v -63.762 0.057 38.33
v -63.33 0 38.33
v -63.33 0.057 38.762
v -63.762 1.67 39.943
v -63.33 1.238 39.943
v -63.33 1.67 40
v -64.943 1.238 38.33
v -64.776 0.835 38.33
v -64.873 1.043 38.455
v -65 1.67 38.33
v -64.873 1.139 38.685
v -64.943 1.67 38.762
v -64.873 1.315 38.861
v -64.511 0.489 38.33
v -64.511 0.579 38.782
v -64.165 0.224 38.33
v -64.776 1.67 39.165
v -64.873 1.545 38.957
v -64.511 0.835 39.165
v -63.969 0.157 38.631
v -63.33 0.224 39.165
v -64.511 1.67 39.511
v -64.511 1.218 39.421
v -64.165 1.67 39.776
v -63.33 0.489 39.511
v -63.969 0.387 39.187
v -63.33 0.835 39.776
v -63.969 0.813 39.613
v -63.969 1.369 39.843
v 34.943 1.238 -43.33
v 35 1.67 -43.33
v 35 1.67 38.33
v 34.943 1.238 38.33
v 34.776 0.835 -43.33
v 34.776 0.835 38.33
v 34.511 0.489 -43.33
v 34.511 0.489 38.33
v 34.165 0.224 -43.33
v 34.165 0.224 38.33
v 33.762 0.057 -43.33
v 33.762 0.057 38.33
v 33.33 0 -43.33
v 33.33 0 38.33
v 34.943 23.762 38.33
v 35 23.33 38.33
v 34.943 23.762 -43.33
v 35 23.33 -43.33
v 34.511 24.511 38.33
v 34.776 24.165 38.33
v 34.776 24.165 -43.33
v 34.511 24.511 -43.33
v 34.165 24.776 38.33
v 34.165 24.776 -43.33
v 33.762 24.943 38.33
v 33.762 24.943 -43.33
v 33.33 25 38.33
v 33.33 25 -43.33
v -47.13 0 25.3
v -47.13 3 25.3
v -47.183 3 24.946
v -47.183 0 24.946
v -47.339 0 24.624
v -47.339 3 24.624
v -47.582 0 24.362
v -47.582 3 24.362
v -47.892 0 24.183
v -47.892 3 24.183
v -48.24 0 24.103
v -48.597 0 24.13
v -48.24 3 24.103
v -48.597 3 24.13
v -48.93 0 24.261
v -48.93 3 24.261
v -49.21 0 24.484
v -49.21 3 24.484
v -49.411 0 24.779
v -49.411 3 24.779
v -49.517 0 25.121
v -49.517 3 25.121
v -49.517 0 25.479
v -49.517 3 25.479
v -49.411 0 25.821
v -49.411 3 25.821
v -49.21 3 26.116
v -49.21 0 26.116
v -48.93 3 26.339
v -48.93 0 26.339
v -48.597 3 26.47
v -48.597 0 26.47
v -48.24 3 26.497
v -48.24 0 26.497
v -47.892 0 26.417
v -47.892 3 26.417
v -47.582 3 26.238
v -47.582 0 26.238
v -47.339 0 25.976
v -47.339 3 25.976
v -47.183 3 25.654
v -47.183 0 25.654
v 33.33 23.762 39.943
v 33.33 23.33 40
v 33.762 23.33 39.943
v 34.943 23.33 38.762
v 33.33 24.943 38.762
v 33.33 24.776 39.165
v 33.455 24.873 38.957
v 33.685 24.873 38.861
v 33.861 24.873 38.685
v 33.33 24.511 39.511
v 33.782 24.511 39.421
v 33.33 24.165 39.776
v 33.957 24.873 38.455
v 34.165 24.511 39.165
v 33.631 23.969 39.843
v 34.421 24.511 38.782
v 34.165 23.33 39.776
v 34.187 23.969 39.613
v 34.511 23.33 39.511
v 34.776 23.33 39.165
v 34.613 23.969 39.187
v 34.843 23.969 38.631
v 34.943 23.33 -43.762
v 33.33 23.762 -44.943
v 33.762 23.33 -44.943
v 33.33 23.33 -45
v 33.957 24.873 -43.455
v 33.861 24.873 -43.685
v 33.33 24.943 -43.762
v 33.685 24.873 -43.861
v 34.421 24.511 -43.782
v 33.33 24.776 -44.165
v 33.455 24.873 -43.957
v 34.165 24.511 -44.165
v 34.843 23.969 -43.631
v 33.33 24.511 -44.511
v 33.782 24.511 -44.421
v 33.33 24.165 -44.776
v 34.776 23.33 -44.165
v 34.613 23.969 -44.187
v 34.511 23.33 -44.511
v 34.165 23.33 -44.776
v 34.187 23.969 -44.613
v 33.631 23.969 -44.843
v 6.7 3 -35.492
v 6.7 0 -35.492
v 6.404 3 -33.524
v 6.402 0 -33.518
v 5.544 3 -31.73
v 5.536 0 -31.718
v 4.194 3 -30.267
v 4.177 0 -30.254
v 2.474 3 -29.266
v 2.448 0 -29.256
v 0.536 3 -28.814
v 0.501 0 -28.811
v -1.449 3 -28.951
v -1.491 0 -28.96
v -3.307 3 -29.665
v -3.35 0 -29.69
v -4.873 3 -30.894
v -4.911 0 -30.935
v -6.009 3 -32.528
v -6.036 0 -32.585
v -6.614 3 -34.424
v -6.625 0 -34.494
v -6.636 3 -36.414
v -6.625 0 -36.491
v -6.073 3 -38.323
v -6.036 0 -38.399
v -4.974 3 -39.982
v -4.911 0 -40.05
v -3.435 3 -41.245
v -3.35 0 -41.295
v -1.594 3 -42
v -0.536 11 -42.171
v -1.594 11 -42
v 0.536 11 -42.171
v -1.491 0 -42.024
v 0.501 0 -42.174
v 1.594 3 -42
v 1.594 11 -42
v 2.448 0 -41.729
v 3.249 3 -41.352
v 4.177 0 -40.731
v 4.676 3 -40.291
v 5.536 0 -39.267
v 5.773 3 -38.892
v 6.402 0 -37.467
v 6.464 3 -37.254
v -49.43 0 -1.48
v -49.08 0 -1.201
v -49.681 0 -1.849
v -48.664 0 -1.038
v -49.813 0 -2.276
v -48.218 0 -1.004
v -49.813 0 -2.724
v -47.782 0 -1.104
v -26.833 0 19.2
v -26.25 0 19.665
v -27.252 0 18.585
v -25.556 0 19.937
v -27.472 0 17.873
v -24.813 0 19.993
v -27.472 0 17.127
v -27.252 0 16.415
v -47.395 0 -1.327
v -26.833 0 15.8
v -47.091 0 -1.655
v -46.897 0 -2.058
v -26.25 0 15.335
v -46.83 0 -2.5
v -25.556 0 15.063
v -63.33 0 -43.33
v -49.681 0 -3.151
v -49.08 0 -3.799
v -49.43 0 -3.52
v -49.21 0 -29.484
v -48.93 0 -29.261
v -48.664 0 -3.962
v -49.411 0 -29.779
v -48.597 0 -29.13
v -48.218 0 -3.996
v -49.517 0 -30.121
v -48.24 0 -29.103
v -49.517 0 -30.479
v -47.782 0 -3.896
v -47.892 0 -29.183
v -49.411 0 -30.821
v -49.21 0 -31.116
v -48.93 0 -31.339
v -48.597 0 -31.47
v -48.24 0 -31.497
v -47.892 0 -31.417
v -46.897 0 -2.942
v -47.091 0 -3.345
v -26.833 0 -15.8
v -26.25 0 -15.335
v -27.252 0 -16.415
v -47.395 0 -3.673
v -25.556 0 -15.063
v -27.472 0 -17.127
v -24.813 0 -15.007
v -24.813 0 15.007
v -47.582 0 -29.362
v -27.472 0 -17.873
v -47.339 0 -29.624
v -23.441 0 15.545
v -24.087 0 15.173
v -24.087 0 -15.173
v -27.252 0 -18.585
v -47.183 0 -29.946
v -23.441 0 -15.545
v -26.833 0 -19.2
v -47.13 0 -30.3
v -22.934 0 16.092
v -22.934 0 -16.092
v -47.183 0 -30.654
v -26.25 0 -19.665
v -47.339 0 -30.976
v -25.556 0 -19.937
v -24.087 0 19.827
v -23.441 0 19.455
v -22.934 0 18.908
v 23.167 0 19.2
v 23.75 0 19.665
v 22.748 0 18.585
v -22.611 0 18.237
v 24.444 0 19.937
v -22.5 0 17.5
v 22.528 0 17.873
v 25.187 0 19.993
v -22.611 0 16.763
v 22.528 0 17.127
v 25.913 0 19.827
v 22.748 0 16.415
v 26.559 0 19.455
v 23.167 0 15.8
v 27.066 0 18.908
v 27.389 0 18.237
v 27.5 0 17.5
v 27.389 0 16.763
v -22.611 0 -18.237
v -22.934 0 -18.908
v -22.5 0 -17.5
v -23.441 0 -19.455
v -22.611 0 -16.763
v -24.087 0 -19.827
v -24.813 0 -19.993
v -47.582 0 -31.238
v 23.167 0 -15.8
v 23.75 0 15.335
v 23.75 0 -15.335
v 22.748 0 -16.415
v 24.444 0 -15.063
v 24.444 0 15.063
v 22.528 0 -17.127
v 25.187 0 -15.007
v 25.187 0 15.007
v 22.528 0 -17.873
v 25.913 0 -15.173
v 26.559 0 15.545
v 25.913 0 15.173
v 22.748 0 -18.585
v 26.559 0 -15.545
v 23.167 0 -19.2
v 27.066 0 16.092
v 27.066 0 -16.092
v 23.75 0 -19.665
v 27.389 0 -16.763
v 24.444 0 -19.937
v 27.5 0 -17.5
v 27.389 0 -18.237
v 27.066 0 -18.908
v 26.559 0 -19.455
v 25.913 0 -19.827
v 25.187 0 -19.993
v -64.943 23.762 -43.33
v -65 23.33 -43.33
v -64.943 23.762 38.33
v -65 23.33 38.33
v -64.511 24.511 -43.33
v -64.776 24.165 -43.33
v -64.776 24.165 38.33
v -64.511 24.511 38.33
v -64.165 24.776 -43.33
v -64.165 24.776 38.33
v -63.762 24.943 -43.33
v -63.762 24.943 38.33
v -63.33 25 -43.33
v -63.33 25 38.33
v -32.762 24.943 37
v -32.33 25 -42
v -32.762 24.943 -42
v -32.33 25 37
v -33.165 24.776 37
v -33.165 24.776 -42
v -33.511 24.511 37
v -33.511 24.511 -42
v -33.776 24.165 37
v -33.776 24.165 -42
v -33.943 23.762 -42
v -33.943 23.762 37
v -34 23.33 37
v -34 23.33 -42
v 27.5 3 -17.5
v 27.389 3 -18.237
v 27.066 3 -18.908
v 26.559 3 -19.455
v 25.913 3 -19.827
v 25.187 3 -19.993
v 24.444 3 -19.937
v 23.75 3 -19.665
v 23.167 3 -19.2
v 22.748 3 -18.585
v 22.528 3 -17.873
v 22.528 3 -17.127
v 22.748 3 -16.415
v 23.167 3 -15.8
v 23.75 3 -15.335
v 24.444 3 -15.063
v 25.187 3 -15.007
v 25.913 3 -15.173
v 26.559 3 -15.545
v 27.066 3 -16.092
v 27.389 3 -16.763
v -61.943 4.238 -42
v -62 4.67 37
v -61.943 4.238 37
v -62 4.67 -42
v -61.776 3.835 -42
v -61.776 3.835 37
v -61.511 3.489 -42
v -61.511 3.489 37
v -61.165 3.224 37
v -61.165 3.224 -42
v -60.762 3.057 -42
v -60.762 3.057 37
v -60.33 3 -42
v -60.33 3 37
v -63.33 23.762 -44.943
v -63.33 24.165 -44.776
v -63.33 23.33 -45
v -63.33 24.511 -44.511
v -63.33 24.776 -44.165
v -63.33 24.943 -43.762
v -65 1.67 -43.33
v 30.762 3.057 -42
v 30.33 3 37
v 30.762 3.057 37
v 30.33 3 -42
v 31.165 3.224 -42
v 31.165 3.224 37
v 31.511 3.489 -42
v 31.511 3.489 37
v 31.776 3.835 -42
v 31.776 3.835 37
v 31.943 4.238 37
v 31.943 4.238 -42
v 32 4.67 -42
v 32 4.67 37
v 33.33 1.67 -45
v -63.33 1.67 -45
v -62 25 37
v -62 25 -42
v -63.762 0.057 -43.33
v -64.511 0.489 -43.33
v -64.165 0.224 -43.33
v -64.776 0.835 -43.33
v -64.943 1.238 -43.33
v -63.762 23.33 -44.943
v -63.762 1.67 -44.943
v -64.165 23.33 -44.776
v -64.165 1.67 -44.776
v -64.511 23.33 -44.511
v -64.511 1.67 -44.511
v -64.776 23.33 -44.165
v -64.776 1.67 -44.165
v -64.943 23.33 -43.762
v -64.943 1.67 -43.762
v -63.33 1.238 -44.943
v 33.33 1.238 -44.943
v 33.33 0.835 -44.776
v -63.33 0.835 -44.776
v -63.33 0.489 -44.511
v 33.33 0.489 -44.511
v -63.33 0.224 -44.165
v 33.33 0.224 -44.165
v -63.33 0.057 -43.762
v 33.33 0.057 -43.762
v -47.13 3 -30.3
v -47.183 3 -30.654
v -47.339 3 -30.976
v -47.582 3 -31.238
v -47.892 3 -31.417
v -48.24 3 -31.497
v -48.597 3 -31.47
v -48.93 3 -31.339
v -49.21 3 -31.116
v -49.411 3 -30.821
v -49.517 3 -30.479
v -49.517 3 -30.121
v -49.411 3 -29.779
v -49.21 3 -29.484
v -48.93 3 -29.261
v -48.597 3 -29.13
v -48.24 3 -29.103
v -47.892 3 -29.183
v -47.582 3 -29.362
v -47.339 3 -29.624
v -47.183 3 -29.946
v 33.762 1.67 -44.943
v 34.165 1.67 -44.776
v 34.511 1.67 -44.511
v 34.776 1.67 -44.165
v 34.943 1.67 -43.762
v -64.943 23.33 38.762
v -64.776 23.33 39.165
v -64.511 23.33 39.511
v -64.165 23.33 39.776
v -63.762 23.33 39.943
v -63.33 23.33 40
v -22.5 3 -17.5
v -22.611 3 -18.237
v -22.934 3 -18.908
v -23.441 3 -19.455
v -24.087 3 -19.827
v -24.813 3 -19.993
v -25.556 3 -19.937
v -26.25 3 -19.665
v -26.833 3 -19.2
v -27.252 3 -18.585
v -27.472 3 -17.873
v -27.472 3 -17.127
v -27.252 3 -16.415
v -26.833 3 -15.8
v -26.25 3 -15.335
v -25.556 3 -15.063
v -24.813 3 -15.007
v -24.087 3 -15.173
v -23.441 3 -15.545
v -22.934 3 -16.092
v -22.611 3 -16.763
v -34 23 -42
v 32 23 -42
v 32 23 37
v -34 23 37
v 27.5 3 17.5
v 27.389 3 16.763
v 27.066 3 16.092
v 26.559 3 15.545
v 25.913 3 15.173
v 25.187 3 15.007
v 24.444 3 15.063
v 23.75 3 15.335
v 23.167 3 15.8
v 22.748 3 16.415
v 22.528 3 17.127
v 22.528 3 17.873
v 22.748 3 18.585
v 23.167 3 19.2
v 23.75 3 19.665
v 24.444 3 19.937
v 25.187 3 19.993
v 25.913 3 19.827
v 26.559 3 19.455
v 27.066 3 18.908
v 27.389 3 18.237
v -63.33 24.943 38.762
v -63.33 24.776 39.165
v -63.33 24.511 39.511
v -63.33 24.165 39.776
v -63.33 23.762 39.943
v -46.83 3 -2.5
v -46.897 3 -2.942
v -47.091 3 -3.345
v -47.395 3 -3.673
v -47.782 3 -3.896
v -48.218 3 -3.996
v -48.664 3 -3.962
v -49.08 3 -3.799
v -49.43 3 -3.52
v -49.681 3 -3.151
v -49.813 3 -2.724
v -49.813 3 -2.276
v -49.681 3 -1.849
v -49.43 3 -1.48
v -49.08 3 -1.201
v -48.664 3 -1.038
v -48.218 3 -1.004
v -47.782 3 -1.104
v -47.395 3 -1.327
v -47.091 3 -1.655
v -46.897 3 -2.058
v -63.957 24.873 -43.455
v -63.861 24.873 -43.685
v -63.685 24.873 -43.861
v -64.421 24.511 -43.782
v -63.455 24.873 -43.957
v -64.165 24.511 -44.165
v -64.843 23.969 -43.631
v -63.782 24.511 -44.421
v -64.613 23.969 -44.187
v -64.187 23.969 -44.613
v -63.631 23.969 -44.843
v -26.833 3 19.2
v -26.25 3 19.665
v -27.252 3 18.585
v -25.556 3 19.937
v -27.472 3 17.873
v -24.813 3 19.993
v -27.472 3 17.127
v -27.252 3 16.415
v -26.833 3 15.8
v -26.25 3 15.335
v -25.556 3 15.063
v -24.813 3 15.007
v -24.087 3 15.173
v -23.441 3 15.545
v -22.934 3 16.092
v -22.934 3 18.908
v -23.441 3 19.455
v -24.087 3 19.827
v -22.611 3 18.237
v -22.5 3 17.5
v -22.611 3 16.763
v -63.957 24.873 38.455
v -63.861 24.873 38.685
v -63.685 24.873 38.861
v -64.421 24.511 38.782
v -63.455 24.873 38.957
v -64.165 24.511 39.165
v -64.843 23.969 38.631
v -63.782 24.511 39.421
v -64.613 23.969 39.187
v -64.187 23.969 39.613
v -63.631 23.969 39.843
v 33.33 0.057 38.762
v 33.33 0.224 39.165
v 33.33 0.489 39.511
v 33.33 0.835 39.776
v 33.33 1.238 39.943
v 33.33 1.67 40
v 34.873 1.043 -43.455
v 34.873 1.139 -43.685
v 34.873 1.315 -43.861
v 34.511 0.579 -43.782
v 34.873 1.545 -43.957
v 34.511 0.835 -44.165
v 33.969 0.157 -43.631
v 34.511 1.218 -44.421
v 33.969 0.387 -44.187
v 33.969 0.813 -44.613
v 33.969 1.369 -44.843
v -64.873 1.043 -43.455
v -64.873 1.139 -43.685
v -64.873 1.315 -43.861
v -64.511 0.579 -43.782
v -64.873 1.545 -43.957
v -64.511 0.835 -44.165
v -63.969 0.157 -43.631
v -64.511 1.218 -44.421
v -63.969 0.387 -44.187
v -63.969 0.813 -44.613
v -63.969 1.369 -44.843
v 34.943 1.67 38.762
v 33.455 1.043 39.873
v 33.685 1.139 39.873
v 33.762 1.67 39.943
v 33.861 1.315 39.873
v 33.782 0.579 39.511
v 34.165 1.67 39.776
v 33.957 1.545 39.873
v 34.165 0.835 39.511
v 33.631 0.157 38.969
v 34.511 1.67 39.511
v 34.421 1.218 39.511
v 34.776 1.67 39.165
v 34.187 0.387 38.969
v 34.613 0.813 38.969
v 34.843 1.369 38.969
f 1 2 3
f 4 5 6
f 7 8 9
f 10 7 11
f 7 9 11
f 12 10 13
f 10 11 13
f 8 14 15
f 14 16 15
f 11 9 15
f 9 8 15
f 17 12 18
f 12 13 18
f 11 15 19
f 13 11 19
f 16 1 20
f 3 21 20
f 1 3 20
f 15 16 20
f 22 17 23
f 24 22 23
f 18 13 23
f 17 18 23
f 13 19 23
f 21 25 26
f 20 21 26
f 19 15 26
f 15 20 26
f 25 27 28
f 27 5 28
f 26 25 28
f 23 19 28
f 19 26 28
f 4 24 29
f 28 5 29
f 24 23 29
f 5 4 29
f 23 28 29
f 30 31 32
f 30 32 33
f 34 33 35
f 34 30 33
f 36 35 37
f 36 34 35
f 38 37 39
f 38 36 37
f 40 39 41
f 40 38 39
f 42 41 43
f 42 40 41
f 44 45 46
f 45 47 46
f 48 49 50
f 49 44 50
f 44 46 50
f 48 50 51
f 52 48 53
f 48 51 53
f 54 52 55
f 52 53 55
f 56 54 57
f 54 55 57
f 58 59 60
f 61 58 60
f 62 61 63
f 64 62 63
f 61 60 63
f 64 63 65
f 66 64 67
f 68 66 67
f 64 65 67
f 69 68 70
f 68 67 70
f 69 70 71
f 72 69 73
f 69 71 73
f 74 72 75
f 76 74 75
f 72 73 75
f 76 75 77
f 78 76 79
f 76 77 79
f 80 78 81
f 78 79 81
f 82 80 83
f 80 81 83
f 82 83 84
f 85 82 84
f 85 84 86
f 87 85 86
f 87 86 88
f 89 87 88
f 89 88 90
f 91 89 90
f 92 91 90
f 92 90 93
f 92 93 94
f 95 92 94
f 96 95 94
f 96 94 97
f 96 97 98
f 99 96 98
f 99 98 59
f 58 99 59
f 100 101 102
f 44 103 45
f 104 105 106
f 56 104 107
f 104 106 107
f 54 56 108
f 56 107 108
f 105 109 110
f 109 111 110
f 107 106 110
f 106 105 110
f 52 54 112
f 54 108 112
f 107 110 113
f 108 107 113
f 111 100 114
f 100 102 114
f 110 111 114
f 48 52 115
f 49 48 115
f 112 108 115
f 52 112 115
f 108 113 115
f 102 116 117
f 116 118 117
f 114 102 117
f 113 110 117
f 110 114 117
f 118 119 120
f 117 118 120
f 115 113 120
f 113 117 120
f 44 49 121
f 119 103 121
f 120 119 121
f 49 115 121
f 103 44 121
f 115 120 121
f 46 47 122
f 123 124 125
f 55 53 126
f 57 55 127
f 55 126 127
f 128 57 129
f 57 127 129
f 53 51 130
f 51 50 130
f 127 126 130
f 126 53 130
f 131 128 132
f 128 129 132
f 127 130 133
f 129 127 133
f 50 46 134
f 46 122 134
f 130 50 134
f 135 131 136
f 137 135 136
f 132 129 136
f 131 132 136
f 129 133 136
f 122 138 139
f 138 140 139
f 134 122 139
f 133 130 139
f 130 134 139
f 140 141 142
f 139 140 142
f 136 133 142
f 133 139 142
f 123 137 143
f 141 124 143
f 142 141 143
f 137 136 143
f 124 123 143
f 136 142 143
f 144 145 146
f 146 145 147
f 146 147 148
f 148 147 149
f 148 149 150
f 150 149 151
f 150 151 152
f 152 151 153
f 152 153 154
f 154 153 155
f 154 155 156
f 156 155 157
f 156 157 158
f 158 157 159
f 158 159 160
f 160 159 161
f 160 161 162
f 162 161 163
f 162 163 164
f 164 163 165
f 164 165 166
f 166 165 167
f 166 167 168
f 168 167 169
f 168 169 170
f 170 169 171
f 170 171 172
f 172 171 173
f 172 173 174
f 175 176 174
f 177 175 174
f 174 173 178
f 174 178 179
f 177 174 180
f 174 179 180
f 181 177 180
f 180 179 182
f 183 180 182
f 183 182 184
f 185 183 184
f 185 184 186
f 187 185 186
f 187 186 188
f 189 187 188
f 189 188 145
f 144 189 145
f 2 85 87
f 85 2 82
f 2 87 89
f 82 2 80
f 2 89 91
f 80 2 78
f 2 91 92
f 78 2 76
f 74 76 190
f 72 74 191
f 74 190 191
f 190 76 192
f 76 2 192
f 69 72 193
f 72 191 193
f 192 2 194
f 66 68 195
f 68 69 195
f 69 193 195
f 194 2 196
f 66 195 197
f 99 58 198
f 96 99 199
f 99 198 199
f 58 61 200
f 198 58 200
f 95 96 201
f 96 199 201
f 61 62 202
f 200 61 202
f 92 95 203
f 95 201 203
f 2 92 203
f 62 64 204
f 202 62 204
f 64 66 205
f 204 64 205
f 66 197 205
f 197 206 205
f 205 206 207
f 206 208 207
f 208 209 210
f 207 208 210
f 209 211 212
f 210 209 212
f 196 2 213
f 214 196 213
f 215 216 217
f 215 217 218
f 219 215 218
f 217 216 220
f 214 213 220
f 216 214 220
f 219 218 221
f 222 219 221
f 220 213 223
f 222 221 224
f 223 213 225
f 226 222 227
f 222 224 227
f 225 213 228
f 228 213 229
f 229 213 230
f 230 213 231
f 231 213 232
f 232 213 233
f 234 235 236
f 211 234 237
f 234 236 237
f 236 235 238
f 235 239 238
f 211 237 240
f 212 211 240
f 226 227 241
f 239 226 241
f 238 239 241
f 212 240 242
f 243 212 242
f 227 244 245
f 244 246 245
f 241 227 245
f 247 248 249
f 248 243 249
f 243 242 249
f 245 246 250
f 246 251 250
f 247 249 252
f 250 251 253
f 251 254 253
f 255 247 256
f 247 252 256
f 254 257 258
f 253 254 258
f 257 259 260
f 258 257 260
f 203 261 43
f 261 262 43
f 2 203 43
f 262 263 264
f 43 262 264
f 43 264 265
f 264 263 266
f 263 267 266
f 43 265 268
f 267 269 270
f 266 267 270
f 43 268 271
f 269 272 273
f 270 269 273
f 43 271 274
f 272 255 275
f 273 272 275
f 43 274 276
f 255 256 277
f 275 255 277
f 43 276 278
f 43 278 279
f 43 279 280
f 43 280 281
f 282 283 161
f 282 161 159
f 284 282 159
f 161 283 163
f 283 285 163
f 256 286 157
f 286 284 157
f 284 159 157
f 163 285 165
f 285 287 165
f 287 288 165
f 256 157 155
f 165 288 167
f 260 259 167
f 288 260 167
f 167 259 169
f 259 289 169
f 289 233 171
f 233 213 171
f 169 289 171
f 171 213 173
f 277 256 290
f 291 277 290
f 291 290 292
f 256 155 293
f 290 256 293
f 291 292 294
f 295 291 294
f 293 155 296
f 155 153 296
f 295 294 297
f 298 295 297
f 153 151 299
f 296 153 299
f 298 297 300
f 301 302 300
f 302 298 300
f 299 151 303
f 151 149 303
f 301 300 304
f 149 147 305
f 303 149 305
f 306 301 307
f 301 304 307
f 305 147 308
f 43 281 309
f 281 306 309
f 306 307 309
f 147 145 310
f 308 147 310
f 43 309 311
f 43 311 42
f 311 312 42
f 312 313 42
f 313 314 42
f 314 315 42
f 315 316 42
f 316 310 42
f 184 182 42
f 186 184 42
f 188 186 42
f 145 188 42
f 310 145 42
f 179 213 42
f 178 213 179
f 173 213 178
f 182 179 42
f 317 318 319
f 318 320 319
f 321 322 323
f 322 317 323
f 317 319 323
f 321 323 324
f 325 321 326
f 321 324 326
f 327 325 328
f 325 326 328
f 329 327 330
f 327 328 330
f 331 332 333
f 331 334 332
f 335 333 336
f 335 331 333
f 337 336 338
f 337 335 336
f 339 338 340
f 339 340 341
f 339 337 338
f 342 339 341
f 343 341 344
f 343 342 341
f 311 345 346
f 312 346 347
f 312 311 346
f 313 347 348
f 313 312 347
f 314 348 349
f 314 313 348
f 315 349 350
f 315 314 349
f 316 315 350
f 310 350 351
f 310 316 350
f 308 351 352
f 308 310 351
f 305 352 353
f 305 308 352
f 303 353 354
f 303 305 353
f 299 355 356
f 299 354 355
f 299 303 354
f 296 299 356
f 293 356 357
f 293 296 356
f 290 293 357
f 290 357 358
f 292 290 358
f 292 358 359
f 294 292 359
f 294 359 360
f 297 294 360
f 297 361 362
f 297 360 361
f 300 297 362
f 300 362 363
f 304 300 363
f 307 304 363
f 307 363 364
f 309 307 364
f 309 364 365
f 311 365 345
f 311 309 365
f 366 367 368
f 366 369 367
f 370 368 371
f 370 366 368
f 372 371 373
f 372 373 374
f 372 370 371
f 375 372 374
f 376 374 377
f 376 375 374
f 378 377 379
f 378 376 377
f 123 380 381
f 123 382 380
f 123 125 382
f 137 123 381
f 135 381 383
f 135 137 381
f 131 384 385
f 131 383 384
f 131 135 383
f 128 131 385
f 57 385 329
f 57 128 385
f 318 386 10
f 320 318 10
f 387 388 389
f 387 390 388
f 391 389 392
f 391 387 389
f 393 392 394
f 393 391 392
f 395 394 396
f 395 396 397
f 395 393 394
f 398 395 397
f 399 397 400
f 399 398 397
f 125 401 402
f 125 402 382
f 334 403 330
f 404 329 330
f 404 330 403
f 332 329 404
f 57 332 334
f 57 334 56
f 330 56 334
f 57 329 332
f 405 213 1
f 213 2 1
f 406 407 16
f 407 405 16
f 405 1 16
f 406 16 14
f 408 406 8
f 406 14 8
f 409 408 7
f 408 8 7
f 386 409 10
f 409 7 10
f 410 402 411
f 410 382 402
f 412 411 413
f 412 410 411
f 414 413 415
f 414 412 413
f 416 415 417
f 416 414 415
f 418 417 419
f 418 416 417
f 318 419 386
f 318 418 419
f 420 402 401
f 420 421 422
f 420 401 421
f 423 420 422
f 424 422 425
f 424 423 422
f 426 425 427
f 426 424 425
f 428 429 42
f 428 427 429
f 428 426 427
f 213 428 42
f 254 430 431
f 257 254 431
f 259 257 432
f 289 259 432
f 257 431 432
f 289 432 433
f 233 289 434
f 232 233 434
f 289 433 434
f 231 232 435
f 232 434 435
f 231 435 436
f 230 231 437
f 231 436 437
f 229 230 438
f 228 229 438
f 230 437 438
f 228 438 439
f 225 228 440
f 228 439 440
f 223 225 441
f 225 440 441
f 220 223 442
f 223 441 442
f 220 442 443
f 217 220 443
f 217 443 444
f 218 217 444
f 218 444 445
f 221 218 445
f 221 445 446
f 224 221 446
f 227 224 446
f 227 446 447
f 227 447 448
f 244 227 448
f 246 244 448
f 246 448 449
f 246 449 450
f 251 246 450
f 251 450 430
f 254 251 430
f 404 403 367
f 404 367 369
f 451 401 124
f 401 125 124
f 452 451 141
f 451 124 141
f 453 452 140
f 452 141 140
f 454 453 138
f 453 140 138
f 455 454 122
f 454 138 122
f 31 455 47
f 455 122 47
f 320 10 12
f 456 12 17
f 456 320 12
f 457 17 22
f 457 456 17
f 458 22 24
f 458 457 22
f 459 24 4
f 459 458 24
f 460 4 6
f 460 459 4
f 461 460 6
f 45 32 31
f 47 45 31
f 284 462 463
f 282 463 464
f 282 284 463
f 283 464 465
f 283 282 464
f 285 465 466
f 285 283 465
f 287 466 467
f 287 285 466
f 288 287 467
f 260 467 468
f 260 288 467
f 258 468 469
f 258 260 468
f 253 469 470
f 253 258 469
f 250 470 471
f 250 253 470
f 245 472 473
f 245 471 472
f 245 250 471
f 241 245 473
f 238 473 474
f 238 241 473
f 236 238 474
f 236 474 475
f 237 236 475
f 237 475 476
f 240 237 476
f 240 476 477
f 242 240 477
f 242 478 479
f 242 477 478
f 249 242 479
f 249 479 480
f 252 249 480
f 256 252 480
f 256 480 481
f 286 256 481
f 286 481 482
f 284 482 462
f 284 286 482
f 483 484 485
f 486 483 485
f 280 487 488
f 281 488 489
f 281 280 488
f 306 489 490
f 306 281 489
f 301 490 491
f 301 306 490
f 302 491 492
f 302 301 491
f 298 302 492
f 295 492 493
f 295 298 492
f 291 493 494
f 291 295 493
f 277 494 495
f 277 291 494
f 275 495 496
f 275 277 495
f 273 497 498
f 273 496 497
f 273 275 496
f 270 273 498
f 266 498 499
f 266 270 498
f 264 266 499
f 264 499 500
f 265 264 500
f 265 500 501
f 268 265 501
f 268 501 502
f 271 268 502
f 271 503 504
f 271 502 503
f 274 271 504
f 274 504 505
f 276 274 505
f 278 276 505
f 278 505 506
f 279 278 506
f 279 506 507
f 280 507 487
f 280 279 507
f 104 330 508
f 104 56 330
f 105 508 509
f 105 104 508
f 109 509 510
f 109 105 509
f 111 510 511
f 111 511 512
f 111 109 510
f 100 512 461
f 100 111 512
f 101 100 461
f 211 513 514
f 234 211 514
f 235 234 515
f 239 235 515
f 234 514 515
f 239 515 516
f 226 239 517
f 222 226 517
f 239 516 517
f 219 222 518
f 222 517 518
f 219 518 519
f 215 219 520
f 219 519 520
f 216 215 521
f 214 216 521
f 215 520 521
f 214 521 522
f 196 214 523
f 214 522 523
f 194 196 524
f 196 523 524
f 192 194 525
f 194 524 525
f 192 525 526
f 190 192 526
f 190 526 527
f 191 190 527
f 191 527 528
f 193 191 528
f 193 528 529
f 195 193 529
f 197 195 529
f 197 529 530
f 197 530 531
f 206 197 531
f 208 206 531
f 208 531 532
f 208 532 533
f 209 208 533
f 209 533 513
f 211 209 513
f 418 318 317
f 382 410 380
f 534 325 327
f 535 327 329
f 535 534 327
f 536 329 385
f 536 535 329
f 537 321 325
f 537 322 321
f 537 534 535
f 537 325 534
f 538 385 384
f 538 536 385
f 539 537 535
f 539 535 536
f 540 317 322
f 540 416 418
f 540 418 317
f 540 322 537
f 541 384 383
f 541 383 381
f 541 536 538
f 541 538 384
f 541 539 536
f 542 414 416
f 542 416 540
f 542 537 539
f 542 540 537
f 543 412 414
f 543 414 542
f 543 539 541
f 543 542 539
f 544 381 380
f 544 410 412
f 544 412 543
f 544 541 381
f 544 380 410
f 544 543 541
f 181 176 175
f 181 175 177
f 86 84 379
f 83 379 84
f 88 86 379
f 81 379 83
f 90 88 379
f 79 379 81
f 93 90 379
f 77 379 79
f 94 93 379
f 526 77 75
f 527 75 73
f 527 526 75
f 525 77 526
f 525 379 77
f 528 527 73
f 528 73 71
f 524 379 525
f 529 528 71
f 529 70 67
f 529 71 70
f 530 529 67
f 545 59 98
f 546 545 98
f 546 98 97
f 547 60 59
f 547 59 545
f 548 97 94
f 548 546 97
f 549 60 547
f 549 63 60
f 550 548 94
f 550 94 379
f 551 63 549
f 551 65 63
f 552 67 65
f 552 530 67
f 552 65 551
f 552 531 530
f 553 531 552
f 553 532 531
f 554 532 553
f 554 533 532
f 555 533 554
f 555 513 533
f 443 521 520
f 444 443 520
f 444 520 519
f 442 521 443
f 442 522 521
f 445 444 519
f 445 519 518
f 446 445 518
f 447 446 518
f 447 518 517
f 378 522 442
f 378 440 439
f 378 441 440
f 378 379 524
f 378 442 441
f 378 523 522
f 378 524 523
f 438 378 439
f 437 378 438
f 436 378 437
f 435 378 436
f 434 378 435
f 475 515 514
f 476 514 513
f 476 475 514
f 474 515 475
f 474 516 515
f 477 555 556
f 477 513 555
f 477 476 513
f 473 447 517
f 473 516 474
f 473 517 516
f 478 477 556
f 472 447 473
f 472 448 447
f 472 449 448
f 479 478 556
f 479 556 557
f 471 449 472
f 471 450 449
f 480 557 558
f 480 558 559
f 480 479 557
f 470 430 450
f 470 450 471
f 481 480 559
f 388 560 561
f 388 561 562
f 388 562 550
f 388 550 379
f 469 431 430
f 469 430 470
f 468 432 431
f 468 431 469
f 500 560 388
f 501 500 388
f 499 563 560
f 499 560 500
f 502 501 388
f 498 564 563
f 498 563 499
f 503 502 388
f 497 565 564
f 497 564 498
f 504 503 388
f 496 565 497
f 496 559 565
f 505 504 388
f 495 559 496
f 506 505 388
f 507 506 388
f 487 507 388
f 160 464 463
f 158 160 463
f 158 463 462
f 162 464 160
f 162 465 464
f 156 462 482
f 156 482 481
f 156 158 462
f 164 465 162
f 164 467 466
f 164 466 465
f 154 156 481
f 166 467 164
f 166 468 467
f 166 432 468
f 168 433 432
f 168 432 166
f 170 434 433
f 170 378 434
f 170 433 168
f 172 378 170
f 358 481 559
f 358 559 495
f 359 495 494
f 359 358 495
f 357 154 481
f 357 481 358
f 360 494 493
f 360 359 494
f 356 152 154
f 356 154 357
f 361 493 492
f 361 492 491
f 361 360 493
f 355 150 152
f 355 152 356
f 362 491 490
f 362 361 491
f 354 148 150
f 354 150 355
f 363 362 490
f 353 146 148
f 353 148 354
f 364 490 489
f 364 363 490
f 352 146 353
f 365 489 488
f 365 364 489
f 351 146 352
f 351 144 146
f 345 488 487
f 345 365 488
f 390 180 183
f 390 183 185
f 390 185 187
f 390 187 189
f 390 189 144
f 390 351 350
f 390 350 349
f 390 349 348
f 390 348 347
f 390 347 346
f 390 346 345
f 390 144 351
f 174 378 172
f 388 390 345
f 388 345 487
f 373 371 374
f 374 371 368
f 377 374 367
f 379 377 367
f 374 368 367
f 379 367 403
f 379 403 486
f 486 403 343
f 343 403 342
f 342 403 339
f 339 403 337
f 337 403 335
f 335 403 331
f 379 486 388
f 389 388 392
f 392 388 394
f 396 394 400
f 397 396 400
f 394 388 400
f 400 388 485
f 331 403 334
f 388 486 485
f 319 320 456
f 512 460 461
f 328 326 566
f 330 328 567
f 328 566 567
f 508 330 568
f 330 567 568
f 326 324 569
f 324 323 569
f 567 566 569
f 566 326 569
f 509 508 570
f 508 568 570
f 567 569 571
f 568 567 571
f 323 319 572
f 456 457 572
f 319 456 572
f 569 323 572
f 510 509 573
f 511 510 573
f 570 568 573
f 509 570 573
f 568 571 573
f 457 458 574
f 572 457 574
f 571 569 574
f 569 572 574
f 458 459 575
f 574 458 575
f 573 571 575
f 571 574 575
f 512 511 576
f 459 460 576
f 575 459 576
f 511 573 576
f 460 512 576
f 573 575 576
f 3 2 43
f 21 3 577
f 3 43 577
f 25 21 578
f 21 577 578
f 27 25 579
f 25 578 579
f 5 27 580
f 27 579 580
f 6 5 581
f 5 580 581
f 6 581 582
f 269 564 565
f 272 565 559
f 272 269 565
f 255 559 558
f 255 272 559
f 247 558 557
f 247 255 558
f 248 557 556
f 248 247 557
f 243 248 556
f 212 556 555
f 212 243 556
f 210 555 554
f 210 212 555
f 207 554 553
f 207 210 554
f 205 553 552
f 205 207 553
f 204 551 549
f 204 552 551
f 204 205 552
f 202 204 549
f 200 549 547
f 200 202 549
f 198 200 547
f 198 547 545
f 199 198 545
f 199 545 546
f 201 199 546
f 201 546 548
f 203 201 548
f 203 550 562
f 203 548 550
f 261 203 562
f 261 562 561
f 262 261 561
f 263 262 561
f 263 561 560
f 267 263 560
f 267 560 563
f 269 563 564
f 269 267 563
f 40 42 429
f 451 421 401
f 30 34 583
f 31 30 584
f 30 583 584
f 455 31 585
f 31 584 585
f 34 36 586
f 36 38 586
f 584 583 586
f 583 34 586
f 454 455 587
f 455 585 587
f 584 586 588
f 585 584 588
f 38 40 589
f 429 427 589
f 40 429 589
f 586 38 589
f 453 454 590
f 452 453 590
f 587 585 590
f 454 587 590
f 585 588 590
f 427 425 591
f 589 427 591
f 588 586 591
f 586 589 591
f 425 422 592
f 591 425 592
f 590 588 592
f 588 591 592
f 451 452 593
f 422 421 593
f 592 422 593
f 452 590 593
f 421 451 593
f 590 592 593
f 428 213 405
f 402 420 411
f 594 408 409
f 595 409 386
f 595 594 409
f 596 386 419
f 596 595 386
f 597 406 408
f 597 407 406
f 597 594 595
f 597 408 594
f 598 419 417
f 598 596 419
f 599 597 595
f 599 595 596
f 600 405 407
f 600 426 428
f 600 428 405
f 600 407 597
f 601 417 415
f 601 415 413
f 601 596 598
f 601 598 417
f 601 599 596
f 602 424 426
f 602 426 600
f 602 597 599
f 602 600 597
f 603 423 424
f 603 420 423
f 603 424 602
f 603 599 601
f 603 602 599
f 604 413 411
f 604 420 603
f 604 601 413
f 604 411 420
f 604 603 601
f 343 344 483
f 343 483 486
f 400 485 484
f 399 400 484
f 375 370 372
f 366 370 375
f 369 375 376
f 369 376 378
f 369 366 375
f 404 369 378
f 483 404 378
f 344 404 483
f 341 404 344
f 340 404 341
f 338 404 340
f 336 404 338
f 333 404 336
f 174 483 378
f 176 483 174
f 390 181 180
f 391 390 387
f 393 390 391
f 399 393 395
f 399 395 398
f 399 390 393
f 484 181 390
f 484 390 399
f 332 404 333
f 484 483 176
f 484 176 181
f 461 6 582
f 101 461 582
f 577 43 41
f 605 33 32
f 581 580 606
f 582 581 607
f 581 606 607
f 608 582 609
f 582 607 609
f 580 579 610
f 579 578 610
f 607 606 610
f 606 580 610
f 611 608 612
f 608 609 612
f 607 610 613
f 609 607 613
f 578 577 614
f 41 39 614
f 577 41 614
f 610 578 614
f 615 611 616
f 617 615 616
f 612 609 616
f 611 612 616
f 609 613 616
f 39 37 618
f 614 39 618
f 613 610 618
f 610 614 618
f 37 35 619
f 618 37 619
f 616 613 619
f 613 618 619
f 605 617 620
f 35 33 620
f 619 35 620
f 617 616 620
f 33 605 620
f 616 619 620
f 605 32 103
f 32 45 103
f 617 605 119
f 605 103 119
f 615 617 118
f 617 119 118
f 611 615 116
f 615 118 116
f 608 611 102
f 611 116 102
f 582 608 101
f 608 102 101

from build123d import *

# Parameters (mm, degrees)
SKETCH1_R           = 2.5
BOSS_EXTRUDE1_DEPTH = 25
SKETCH5_W           = 94
SKETCH5_H           = 79
CUT_EXTRUDE2_DEPTH  = 22
SKETCH7_W           = 85
SKETCH7_H           = 2
BOSS_EXTRUDE4_DEPTH = 66
SKETCH8_R           = 6.7
CUT_EXTRUDE3_DEPTH  = 11
FILLET1_R           = 1.67
SKETCH9_R           = 1.5
SKETCH9_R_2         = 1.2
CUT_EXTRUDE4_DEPTH  = 10


with BuildPart() as part:
    # Sketch1 → Boss-Extrude1 (new body)
    with BuildSketch(Plane(origin=(0, 0, 0), x_dir=(1, 0, 0), z_dir=(0, 1, 0))):
        Polygon((-65, 45), (-65, 37.5), (-65, -32.5), (-65, -40), (35, -40), (35, -32.5), (35, 37.5), (35, 45), align=None)
        with Locations((-25, -17.5)):
            Circle(SKETCH1_R, mode=Mode.SUBTRACT)
        with Locations((25, -17.5)):
            Circle(SKETCH1_R, mode=Mode.SUBTRACT)
        with Locations((-25, 17.5)):
            Circle(SKETCH1_R, mode=Mode.SUBTRACT)
        with Locations((25, 17.5)):
            Circle(SKETCH1_R, mode=Mode.SUBTRACT)
    extrude(amount=BOSS_EXTRUDE1_DEPTH)

    # Sketch5 → Cut-Extrude2 (cut)
    with BuildSketch(Plane(origin=(0, 25, 0), x_dir=(1, 0, 0), z_dir=(0, 1, 0))):
        with Locations((-15, 2.5)):
            Rectangle(SKETCH5_W, SKETCH5_H)
    extrude(amount=-CUT_EXTRUDE2_DEPTH, mode=Mode.SUBTRACT)

    # Sketch7 → Boss-Extrude4 (add)
    with BuildSketch(Plane.ZY.offset(-32)):
        with Locations((-2.5, 24)):
            Rectangle(SKETCH7_W, SKETCH7_H)
    extrude(amount=BOSS_EXTRUDE4_DEPTH)

    # Sketch8 → Cut-Extrude3 (cut)
    with BuildSketch(Plane.XZ):
        with Locations((0, -35.492425409)):
            Circle(SKETCH8_R)
    extrude(amount=-CUT_EXTRUDE3_DEPTH, mode=Mode.SUBTRACT)

    # Fillet1
    fillet1_edges = [part.edges().sort_by_distance(p)[0] for p in [
        (-15, 0, -45),
        (35, 0, -2.5),
        (-15, 0, 40),
        (-65, 0, -2.5),
        (-65, 12.5, -45),
        (35, 12.5, -45),
        (35, 12.5, 40),
        (-65, 12.5, 40),
        (-65, 25, -2.5),
        (32, 3, -2.5),
        (-62, 3, -2.5),
        (-15, 25, 40),
        (35, 25, -2.5),
        (-15, 25, -45),
        (-34, 25, -2.5),
    ]]
    fillet(fillet1_edges, radius=FILLET1_R)

    # Sketch9 → Cut-Extrude4 (cut)
    with BuildSketch(Plane(origin=(0, 3, 0), x_dir=(1, 0, 0), z_dir=(0, 1, 0))):
        with Locations((-48.33, 2.5)):
            Circle(SKETCH9_R)
        with Locations((-48.33, 30.3)):
            Circle(SKETCH9_R_2)
        with Locations((-48.33, -25.3)):
            Circle(SKETCH9_R_2)
    extrude(amount=-CUT_EXTRUDE4_DEPTH, mode=Mode.SUBTRACT)


solid = part.part
